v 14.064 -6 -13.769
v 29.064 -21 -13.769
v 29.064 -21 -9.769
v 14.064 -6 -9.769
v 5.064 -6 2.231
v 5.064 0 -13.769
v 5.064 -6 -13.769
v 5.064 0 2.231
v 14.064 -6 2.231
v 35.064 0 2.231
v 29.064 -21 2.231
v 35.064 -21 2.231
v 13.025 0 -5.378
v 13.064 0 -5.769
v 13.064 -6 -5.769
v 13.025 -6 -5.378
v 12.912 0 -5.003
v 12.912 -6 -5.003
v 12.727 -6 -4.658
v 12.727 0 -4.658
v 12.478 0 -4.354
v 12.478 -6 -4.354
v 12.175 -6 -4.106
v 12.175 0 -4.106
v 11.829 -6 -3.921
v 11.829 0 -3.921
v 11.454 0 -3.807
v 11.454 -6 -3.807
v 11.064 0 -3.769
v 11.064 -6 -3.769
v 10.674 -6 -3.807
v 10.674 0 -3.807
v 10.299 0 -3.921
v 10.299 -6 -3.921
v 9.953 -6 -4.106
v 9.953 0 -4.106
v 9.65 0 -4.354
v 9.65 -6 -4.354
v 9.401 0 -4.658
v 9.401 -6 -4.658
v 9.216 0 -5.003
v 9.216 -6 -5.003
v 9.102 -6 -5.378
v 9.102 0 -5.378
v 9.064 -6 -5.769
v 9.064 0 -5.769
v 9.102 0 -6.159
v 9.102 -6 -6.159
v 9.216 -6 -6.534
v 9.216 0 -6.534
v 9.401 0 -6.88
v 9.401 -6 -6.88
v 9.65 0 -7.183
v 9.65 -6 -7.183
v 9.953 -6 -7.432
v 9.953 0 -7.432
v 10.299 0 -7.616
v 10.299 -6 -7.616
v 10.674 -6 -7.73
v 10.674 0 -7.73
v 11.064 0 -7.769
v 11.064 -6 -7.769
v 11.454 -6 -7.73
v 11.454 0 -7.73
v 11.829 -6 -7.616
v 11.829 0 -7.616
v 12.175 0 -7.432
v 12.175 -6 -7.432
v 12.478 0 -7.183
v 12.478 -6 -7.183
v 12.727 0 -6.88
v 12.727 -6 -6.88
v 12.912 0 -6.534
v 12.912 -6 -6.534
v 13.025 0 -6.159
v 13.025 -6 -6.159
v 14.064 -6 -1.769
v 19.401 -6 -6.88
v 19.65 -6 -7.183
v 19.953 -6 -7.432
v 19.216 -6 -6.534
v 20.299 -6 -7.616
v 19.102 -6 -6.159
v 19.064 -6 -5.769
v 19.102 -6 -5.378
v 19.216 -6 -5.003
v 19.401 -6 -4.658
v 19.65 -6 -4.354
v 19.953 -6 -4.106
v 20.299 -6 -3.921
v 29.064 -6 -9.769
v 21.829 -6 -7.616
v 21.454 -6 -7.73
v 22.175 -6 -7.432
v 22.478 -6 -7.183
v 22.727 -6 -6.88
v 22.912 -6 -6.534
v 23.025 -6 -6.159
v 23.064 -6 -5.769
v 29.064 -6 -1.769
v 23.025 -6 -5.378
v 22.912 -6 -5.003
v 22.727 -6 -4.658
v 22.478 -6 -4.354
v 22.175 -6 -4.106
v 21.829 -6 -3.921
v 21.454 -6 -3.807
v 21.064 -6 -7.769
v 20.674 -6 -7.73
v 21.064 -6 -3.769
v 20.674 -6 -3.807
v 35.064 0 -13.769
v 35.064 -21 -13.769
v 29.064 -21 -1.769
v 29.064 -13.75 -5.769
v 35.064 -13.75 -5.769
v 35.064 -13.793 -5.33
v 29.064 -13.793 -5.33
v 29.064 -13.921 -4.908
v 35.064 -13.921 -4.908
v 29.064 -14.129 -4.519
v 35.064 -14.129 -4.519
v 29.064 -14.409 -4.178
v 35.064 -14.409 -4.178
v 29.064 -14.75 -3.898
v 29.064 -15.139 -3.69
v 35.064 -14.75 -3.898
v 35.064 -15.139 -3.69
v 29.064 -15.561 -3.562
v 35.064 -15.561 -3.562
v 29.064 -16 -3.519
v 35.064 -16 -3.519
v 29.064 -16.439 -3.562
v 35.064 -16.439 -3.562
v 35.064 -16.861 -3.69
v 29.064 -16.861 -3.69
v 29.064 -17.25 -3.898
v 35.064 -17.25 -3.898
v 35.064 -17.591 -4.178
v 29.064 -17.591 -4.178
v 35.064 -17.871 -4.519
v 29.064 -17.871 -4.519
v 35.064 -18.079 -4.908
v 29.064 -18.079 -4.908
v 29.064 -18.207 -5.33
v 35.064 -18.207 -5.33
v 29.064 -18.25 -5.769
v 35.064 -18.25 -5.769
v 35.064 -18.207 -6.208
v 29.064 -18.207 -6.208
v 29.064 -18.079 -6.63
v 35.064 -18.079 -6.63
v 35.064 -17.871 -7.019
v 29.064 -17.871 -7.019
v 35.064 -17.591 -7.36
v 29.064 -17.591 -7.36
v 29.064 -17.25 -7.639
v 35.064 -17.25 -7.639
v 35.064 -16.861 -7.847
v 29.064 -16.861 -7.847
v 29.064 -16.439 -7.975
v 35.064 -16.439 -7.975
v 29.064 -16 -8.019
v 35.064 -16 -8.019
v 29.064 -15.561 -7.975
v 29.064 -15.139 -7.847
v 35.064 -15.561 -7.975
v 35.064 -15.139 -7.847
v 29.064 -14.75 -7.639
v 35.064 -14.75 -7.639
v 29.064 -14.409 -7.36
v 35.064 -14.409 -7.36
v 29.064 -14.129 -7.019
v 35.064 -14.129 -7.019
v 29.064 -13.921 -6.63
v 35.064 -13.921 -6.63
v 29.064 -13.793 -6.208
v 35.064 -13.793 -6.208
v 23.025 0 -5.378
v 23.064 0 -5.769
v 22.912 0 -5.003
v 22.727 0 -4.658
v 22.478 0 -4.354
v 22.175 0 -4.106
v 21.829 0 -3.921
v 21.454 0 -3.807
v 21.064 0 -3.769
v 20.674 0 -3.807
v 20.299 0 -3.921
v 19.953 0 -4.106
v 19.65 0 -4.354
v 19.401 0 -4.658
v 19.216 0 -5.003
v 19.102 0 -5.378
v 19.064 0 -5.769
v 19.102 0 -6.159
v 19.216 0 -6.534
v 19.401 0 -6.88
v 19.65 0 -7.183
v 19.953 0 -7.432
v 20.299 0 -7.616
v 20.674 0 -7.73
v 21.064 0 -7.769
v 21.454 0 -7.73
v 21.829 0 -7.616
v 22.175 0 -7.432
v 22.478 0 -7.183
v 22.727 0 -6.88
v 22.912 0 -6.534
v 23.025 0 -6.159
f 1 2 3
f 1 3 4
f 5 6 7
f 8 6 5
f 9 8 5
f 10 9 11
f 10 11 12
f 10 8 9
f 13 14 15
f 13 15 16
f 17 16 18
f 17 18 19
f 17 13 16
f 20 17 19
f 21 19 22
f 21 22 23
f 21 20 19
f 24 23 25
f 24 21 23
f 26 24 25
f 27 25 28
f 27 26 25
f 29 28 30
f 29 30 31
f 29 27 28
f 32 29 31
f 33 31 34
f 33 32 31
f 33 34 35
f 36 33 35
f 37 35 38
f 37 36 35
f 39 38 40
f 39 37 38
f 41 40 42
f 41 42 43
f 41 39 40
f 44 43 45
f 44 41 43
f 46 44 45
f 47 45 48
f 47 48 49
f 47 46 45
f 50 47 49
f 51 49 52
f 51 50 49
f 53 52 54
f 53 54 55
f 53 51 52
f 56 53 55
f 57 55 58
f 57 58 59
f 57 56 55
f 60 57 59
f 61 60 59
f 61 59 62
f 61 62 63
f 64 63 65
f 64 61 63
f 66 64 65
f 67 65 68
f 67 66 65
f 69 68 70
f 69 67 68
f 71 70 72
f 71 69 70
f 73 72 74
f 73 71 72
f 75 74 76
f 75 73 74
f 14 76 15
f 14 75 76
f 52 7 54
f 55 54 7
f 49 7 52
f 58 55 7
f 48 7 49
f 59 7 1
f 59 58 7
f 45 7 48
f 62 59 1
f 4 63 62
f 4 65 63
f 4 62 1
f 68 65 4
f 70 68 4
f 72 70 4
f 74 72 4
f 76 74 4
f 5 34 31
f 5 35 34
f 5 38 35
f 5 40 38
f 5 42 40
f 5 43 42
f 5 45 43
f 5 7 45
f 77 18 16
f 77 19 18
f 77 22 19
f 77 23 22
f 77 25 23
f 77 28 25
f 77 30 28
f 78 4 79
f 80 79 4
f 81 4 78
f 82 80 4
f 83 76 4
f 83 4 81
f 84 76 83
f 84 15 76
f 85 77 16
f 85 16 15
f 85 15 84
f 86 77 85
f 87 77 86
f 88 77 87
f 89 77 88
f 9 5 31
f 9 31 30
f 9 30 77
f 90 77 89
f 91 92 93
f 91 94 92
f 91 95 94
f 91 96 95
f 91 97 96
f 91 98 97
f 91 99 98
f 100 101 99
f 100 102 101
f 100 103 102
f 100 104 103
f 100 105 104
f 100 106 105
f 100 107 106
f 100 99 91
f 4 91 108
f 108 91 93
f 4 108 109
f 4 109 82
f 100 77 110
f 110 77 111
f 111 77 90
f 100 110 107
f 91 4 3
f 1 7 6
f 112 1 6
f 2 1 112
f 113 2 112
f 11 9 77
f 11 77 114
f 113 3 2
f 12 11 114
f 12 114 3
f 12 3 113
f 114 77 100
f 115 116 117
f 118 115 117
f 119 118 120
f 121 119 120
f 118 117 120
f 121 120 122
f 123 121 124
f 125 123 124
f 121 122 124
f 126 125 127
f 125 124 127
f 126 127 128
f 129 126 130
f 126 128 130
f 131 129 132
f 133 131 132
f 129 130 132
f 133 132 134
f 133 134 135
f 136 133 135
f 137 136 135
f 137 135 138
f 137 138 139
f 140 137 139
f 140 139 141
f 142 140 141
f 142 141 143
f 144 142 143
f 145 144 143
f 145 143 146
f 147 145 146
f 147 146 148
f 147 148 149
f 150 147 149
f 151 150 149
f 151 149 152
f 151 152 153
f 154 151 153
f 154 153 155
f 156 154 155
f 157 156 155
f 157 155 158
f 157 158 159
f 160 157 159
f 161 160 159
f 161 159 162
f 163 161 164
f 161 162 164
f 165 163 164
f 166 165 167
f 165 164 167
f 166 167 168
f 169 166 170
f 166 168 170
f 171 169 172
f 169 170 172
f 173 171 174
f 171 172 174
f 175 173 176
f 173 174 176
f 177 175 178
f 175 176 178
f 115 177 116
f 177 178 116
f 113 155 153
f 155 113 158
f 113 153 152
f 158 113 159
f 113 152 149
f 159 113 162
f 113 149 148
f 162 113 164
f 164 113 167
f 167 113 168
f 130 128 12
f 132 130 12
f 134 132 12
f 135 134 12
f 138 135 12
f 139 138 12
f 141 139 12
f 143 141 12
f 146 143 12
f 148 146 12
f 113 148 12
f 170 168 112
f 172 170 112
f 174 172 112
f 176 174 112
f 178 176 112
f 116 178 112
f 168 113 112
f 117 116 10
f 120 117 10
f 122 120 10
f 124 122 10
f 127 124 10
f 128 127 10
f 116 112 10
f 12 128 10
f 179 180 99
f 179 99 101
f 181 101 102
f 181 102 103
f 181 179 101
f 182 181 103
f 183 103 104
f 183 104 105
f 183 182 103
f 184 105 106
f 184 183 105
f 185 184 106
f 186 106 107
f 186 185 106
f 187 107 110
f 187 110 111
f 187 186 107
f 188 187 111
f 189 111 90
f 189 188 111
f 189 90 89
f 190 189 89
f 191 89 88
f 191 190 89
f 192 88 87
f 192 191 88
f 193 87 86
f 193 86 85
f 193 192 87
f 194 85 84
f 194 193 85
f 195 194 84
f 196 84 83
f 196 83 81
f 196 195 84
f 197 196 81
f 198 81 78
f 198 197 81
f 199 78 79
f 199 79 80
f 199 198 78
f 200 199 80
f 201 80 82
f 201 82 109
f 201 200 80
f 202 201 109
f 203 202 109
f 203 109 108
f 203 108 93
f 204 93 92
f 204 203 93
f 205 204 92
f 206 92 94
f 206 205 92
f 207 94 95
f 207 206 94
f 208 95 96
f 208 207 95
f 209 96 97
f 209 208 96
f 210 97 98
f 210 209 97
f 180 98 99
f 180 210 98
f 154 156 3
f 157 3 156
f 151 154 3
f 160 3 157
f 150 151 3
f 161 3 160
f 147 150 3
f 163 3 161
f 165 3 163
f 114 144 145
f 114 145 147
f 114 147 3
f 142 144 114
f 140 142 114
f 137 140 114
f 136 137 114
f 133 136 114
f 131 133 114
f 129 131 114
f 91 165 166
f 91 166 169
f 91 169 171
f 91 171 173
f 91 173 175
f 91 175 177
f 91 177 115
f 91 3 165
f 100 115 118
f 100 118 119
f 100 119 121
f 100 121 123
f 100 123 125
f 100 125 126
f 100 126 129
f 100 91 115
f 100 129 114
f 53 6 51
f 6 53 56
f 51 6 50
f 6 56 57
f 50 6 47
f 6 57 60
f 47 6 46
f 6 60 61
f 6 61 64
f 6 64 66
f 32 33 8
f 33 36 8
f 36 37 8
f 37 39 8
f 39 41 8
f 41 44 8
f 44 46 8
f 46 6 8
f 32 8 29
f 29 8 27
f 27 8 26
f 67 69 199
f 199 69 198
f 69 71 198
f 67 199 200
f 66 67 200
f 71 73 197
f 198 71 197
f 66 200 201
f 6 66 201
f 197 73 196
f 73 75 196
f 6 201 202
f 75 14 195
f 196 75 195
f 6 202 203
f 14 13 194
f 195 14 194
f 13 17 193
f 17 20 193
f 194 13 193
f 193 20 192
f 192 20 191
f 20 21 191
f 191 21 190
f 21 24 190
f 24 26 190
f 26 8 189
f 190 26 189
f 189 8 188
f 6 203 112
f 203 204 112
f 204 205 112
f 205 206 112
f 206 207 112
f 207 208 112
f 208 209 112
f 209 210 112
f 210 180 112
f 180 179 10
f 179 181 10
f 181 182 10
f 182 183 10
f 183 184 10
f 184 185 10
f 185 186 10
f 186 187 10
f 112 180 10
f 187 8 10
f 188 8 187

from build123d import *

# Parameters (mm, degrees)
F0_W     = 30
F0_H     = 16
F0_R     = 2
F1_DEPTH = 6
F2_W     = 6
F2_H     = 16
F3_DEPTH = 15
F5_DEPTH = 4
F7_DEPTH = 4
F8_R     = 2.25
F9_DEPTH = 25


with BuildPart() as f1:
    # F0 (on Front) → F1 (new body)
    with BuildSketch(Plane.XZ):
        with Locations((20.063871, -5.768647)):
            Rectangle(F0_W, F0_H)
        with Locations((11.063871, -5.768647)):
            Circle(F0_R, mode=Mode.SUBTRACT)
        with Locations((21.063871, -5.768647)):
            Circle(F0_R, mode=Mode.SUBTRACT)
    extrude(amount=F1_DEPTH)

    # F2 (on face) → F3 (join)
    with BuildSketch(Plane.XZ.offset(6)):
        with Locations((32.063871, -5.768647)):
            Rectangle(F2_W, F2_H)
    extrude(amount=F3_DEPTH)

    # F4 (on face) → F5 (join)
    with BuildSketch(Plane(origin=(0, 0, -13.768647), x_dir=(1, 0, 0), z_dir=(0, 0, -1))):
        Polygon((29.063871, 21), (14.063871, 6), (29.063871, 6), align=None)
    extrude(amount=-F5_DEPTH)

    # F6 (on face) → F7 (join)
    with BuildSketch(Plane.XY.offset(2.231353)):
        Polygon((29.063871, -21), (29.063871, -6), (14.063871, -6), align=None)
    extrude(amount=-F7_DEPTH)

    # F8 (on face) → F9 (cut)
    with BuildSketch(Plane.YZ.offset(35.063871)):
        with Locations((-16, -5.768647)):
            Circle(F8_R)
    extrude(amount=-F9_DEPTH, mode=Mode.SUBTRACT)


solid = f1.part
